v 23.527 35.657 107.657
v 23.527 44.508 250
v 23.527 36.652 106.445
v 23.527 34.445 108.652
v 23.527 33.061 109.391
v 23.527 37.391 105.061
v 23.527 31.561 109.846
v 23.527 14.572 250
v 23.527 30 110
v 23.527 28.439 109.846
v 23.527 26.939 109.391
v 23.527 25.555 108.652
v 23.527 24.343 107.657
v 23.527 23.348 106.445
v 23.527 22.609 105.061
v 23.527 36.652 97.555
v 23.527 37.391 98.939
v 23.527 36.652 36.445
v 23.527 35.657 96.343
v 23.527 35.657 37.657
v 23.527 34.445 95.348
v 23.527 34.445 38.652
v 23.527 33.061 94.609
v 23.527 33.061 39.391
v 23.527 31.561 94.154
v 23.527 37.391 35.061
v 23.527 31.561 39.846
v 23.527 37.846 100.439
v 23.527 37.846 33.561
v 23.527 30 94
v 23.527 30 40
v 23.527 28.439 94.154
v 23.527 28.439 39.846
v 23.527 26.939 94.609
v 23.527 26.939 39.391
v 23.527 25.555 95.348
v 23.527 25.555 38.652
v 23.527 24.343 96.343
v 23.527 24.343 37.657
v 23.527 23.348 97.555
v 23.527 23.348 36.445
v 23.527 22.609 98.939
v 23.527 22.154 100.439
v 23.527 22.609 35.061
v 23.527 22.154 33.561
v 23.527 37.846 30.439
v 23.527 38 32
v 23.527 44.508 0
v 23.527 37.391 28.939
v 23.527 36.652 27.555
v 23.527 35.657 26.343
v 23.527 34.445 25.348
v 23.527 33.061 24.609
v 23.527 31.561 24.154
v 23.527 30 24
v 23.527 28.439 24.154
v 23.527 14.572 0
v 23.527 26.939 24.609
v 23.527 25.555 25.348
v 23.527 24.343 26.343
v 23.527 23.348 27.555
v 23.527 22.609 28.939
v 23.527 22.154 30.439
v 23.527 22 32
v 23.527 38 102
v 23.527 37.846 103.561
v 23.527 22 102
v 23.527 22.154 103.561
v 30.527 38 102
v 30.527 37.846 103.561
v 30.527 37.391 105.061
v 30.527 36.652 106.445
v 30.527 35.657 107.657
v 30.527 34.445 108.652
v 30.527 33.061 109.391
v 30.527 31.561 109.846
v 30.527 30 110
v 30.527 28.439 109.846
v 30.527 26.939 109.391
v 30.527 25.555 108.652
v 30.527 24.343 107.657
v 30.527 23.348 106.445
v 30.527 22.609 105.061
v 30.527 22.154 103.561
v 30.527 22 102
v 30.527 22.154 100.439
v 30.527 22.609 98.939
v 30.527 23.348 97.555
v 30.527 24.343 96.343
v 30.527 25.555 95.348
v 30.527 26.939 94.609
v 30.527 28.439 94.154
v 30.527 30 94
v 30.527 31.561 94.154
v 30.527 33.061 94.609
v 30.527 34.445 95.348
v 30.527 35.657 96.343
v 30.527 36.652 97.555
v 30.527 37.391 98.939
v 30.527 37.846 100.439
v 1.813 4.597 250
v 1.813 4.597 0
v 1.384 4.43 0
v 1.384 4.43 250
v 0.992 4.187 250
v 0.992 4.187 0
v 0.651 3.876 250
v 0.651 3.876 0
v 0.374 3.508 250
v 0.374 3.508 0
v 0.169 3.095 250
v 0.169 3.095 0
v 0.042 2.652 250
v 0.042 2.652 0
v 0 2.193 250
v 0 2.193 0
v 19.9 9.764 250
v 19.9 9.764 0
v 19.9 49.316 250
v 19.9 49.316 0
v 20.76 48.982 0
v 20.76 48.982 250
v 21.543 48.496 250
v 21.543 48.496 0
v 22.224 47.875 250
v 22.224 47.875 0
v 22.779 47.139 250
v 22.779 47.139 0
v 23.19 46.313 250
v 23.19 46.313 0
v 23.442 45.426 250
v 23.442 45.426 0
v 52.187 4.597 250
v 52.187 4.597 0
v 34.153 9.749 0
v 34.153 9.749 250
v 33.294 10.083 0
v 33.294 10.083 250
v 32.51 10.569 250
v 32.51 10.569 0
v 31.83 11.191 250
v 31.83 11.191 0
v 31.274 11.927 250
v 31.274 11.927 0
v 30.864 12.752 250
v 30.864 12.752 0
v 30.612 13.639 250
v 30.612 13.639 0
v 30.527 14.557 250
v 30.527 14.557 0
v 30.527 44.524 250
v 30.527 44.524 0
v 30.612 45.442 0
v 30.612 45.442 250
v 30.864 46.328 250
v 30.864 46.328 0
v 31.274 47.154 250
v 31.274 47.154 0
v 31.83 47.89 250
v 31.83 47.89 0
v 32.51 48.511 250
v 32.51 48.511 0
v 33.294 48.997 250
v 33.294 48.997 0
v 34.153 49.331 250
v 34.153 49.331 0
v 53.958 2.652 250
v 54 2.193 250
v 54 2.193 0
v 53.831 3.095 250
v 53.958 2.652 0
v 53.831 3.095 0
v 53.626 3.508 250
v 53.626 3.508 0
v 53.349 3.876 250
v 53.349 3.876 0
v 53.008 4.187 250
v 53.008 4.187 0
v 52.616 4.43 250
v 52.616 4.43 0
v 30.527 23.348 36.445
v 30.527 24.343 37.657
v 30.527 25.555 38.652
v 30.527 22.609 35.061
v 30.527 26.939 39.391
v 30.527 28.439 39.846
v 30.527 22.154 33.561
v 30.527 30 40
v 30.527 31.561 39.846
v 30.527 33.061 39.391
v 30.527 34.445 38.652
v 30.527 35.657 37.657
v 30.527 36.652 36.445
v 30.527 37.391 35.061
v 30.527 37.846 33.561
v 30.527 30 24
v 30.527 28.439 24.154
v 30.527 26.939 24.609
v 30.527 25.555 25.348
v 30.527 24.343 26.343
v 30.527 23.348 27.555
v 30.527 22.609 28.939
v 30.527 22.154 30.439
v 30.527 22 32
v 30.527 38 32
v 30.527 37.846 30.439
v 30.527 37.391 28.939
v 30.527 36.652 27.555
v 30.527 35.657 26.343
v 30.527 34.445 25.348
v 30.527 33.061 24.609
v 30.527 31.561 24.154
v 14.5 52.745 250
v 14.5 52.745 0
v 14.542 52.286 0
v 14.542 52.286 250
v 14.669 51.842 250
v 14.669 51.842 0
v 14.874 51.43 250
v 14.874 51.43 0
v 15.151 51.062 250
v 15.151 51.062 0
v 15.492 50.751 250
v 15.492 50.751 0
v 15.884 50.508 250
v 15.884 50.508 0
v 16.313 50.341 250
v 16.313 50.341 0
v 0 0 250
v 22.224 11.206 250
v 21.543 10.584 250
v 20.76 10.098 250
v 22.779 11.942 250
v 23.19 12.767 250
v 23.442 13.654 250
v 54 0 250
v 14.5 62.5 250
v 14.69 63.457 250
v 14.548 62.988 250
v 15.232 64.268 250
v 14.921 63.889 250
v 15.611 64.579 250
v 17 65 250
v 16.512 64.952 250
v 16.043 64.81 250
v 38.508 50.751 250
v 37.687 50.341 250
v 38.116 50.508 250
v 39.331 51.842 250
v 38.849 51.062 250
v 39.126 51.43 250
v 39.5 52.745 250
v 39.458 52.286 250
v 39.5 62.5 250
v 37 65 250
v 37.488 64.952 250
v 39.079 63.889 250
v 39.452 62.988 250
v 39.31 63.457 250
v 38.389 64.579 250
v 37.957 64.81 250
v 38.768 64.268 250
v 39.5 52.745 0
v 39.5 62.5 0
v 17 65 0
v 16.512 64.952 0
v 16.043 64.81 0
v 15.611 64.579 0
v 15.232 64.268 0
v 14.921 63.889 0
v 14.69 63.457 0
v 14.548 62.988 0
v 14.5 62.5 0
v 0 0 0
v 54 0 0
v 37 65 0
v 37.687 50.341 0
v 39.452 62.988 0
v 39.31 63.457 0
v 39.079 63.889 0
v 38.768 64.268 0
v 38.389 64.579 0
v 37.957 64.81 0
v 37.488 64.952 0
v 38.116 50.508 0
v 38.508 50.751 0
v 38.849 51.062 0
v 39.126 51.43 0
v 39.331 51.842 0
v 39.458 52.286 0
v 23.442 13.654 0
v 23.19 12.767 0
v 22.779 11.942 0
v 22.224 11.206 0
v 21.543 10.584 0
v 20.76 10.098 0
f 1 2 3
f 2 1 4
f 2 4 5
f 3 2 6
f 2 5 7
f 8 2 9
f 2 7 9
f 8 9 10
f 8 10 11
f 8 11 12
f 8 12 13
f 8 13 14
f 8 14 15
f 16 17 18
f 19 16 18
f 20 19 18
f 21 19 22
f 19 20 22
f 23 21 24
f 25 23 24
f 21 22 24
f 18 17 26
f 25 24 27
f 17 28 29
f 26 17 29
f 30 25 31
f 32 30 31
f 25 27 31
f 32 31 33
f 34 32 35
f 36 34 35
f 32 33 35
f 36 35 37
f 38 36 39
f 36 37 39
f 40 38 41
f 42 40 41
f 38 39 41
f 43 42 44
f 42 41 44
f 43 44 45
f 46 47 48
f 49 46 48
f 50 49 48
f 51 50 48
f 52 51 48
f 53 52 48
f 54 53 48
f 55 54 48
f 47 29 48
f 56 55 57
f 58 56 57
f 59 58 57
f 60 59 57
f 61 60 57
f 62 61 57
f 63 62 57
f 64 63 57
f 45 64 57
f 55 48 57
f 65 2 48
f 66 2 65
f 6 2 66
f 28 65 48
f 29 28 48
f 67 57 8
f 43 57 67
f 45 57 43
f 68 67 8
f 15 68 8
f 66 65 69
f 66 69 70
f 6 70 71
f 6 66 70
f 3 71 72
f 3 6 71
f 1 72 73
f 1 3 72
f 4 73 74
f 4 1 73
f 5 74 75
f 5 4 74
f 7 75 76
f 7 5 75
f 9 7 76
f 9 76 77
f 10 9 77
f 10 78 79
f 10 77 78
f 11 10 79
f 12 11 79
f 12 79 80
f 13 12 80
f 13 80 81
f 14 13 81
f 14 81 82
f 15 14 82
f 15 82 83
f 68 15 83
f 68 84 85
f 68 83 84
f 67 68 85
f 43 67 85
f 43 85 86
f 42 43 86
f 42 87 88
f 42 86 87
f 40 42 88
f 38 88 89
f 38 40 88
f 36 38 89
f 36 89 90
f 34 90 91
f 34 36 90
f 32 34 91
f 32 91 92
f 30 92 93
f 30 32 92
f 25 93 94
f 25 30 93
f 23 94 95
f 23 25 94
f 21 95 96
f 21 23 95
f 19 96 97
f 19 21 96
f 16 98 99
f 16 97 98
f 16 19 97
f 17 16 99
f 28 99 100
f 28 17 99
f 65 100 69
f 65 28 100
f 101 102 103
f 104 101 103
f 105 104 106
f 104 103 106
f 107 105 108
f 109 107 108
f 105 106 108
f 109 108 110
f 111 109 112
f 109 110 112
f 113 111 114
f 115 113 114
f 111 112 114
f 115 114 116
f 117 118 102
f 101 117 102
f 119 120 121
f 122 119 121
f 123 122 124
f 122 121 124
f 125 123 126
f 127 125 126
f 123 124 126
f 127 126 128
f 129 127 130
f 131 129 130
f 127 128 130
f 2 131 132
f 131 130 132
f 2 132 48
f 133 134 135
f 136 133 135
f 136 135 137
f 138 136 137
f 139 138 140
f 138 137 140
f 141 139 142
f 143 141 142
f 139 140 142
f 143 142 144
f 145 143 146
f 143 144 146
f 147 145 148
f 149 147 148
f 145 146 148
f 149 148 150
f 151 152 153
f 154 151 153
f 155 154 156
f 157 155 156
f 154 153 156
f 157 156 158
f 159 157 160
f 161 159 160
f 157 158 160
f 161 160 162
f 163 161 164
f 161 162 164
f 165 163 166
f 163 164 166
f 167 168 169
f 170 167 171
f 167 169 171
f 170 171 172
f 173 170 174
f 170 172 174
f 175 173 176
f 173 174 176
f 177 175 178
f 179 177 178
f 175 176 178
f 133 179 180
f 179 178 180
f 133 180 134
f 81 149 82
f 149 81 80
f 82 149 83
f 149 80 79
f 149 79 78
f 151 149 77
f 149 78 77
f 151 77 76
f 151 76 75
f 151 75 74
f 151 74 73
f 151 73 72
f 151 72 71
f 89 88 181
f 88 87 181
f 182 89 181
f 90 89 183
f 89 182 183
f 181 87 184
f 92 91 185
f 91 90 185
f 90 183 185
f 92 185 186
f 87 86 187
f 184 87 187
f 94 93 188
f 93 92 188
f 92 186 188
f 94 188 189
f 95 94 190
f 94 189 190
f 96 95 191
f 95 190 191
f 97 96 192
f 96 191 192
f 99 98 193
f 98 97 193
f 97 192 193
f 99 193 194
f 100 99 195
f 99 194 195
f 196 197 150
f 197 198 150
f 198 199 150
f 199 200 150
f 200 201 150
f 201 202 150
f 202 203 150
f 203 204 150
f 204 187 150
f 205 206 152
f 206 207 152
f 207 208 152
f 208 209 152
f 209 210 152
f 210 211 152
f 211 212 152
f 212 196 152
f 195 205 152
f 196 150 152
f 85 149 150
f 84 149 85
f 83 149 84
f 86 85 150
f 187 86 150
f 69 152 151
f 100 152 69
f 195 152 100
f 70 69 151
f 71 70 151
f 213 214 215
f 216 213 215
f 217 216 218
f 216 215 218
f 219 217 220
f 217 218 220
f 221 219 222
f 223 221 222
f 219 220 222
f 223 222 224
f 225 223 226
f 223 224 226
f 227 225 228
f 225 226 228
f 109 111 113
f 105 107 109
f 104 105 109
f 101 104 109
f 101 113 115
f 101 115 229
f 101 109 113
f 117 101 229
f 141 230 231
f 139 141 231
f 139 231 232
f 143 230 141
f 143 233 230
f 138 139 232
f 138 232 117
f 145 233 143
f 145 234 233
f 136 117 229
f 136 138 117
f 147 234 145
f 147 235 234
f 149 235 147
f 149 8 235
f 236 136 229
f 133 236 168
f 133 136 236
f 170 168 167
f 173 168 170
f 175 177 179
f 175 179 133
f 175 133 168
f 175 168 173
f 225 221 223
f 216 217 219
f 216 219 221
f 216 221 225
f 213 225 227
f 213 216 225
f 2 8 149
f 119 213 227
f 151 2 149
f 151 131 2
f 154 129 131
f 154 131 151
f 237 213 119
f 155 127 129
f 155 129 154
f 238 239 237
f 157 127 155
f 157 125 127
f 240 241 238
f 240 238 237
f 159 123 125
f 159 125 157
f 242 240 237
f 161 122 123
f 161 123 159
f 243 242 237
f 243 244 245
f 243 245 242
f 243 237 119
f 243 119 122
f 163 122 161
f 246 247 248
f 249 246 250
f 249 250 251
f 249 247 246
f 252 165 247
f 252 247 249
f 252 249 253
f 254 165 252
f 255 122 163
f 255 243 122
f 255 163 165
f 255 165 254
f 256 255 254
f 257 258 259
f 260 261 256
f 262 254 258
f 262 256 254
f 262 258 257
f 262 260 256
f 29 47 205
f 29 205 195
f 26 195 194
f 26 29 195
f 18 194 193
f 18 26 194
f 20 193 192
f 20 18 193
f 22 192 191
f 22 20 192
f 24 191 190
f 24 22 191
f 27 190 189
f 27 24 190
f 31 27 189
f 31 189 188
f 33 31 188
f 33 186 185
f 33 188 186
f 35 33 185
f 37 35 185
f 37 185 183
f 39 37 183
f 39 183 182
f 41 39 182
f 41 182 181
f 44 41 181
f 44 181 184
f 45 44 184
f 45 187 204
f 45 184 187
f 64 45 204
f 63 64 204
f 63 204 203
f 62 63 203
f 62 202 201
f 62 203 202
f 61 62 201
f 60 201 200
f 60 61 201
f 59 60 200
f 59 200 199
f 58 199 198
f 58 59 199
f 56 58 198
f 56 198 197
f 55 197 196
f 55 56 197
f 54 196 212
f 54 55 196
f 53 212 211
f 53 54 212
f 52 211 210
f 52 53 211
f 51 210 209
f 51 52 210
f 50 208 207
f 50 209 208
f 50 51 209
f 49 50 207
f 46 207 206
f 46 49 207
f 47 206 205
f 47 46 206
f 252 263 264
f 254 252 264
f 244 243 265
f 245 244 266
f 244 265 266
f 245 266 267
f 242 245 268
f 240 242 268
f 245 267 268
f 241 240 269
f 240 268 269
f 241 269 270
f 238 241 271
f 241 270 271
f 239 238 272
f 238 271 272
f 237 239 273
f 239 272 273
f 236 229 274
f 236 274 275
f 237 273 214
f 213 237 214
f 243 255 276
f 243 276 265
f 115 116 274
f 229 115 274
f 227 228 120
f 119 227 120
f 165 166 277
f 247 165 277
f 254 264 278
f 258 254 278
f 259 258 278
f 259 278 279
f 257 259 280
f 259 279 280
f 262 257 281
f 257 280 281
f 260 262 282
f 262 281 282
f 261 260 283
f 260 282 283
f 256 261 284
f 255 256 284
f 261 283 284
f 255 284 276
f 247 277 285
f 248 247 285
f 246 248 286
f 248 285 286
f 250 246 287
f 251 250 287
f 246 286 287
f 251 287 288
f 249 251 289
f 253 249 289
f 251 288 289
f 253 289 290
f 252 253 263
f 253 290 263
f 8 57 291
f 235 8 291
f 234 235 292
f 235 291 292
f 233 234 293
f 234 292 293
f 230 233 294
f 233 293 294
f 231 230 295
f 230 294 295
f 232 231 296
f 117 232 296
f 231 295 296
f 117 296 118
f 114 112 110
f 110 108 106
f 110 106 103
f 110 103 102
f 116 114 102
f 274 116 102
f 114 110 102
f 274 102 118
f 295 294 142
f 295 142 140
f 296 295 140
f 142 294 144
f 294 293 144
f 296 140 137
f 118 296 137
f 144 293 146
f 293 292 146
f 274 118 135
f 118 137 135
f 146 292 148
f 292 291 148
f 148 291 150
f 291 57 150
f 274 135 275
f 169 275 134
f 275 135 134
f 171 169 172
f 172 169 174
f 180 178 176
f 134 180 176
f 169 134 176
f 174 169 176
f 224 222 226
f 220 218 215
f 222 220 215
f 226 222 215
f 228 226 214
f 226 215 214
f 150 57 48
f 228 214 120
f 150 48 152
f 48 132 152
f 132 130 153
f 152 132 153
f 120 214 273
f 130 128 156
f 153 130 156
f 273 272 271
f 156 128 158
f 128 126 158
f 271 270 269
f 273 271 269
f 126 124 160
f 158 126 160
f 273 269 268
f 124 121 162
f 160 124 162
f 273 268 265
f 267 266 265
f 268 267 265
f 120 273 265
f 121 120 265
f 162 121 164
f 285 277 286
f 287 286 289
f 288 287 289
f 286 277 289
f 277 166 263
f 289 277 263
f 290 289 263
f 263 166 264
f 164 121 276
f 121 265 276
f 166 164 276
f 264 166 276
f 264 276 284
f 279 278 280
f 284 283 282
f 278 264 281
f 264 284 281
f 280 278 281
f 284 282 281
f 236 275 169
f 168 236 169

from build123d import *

# Parameters (mm, degrees)
EXTRUDE_1_DEPTH     = 250
SKETCH_7_R          = 8
CUT_EXTRUDE_2_DEPTH = 40


with BuildPart() as part:
    # 草图1 → 凸台-拉伸1 (new body)
    with BuildSketch(Plane.XY):
        with BuildLine():
            Line((0, 0), (54, 0))
            Line((54, 0), (54, 2.192931695))
            ThreePointArc((54, 2.192931695), (53.49587162, 3.698420478), (52.18680282, 4.596741564))
            Line((52.18680282, 4.596741564), (34.153085808, 9.749232139))
            ThreePointArc((34.153085808, 9.749232139), (31.534948207, 11.545874311), (30.526691448, 14.556851877))
            Line((30.526691448, 14.556851877), (30.526691448, 44.523721966))
            ThreePointArc((30.526691448, 44.523721966), (31.534948207, 47.534699532), (34.153085808, 49.331341705))
            Line((34.153085808, 49.331341705), (37.68680282, 50.340975136))
            ThreePointArc((37.68680282, 50.340975136), (38.99587162, 51.239296223), (39.5, 52.744785005))
            Line((39.5, 52.744785005), (39.5, 62.5))
            ThreePointArc((39.5, 62.5), (38.767766953, 64.267766953), (37, 65))
            Line((37, 65), (17, 65))
            ThreePointArc((17, 65), (15.232233047, 64.267766953), (14.5, 62.5))
            Line((14.5, 62.5), (14.5, 52.744785005))
            ThreePointArc((14.5, 52.744785005), (15.00412838, 51.239296223), (16.31319718, 50.340975136))
            Line((16.31319718, 50.340975136), (19.900297087, 49.316089449))
            ThreePointArc((19.900297087, 49.316089449), (22.518434689, 47.519447276), (23.526691448, 44.50846971))
            Line((23.526691448, 44.50846971), (23.526691448, 14.572104133))
            ThreePointArc((23.526691448, 14.572104133), (22.518434689, 11.561126567), (19.900297087, 9.764484395))
            Line((19.900297087, 9.764484395), (1.81319718, 4.596741564))
            ThreePointArc((1.81319718, 4.596741564), (0.50412838, 3.698420478), (0, 2.192931695))
            Line((0, 2.192931695), (0, 0))
        make_face()
    extrude(amount=EXTRUDE_1_DEPTH)

    # 草图7 → 切除-拉伸2 (cut)
    with BuildSketch(Plane(origin=(0, 0, 0), x_dir=(0, 0, -1), z_dir=(1, 0, 0))):
        with Locations(Location((-32, 30, 0), (0, 0, 90))):
            Circle(SKETCH_7_R)
        with Locations(Location((-102, 30, 0), (0, 0, 90))):
            Circle(SKETCH_7_R)
    extrude(amount=CUT_EXTRUDE_2_DEPTH, mode=Mode.SUBTRACT)


solid = part.part
